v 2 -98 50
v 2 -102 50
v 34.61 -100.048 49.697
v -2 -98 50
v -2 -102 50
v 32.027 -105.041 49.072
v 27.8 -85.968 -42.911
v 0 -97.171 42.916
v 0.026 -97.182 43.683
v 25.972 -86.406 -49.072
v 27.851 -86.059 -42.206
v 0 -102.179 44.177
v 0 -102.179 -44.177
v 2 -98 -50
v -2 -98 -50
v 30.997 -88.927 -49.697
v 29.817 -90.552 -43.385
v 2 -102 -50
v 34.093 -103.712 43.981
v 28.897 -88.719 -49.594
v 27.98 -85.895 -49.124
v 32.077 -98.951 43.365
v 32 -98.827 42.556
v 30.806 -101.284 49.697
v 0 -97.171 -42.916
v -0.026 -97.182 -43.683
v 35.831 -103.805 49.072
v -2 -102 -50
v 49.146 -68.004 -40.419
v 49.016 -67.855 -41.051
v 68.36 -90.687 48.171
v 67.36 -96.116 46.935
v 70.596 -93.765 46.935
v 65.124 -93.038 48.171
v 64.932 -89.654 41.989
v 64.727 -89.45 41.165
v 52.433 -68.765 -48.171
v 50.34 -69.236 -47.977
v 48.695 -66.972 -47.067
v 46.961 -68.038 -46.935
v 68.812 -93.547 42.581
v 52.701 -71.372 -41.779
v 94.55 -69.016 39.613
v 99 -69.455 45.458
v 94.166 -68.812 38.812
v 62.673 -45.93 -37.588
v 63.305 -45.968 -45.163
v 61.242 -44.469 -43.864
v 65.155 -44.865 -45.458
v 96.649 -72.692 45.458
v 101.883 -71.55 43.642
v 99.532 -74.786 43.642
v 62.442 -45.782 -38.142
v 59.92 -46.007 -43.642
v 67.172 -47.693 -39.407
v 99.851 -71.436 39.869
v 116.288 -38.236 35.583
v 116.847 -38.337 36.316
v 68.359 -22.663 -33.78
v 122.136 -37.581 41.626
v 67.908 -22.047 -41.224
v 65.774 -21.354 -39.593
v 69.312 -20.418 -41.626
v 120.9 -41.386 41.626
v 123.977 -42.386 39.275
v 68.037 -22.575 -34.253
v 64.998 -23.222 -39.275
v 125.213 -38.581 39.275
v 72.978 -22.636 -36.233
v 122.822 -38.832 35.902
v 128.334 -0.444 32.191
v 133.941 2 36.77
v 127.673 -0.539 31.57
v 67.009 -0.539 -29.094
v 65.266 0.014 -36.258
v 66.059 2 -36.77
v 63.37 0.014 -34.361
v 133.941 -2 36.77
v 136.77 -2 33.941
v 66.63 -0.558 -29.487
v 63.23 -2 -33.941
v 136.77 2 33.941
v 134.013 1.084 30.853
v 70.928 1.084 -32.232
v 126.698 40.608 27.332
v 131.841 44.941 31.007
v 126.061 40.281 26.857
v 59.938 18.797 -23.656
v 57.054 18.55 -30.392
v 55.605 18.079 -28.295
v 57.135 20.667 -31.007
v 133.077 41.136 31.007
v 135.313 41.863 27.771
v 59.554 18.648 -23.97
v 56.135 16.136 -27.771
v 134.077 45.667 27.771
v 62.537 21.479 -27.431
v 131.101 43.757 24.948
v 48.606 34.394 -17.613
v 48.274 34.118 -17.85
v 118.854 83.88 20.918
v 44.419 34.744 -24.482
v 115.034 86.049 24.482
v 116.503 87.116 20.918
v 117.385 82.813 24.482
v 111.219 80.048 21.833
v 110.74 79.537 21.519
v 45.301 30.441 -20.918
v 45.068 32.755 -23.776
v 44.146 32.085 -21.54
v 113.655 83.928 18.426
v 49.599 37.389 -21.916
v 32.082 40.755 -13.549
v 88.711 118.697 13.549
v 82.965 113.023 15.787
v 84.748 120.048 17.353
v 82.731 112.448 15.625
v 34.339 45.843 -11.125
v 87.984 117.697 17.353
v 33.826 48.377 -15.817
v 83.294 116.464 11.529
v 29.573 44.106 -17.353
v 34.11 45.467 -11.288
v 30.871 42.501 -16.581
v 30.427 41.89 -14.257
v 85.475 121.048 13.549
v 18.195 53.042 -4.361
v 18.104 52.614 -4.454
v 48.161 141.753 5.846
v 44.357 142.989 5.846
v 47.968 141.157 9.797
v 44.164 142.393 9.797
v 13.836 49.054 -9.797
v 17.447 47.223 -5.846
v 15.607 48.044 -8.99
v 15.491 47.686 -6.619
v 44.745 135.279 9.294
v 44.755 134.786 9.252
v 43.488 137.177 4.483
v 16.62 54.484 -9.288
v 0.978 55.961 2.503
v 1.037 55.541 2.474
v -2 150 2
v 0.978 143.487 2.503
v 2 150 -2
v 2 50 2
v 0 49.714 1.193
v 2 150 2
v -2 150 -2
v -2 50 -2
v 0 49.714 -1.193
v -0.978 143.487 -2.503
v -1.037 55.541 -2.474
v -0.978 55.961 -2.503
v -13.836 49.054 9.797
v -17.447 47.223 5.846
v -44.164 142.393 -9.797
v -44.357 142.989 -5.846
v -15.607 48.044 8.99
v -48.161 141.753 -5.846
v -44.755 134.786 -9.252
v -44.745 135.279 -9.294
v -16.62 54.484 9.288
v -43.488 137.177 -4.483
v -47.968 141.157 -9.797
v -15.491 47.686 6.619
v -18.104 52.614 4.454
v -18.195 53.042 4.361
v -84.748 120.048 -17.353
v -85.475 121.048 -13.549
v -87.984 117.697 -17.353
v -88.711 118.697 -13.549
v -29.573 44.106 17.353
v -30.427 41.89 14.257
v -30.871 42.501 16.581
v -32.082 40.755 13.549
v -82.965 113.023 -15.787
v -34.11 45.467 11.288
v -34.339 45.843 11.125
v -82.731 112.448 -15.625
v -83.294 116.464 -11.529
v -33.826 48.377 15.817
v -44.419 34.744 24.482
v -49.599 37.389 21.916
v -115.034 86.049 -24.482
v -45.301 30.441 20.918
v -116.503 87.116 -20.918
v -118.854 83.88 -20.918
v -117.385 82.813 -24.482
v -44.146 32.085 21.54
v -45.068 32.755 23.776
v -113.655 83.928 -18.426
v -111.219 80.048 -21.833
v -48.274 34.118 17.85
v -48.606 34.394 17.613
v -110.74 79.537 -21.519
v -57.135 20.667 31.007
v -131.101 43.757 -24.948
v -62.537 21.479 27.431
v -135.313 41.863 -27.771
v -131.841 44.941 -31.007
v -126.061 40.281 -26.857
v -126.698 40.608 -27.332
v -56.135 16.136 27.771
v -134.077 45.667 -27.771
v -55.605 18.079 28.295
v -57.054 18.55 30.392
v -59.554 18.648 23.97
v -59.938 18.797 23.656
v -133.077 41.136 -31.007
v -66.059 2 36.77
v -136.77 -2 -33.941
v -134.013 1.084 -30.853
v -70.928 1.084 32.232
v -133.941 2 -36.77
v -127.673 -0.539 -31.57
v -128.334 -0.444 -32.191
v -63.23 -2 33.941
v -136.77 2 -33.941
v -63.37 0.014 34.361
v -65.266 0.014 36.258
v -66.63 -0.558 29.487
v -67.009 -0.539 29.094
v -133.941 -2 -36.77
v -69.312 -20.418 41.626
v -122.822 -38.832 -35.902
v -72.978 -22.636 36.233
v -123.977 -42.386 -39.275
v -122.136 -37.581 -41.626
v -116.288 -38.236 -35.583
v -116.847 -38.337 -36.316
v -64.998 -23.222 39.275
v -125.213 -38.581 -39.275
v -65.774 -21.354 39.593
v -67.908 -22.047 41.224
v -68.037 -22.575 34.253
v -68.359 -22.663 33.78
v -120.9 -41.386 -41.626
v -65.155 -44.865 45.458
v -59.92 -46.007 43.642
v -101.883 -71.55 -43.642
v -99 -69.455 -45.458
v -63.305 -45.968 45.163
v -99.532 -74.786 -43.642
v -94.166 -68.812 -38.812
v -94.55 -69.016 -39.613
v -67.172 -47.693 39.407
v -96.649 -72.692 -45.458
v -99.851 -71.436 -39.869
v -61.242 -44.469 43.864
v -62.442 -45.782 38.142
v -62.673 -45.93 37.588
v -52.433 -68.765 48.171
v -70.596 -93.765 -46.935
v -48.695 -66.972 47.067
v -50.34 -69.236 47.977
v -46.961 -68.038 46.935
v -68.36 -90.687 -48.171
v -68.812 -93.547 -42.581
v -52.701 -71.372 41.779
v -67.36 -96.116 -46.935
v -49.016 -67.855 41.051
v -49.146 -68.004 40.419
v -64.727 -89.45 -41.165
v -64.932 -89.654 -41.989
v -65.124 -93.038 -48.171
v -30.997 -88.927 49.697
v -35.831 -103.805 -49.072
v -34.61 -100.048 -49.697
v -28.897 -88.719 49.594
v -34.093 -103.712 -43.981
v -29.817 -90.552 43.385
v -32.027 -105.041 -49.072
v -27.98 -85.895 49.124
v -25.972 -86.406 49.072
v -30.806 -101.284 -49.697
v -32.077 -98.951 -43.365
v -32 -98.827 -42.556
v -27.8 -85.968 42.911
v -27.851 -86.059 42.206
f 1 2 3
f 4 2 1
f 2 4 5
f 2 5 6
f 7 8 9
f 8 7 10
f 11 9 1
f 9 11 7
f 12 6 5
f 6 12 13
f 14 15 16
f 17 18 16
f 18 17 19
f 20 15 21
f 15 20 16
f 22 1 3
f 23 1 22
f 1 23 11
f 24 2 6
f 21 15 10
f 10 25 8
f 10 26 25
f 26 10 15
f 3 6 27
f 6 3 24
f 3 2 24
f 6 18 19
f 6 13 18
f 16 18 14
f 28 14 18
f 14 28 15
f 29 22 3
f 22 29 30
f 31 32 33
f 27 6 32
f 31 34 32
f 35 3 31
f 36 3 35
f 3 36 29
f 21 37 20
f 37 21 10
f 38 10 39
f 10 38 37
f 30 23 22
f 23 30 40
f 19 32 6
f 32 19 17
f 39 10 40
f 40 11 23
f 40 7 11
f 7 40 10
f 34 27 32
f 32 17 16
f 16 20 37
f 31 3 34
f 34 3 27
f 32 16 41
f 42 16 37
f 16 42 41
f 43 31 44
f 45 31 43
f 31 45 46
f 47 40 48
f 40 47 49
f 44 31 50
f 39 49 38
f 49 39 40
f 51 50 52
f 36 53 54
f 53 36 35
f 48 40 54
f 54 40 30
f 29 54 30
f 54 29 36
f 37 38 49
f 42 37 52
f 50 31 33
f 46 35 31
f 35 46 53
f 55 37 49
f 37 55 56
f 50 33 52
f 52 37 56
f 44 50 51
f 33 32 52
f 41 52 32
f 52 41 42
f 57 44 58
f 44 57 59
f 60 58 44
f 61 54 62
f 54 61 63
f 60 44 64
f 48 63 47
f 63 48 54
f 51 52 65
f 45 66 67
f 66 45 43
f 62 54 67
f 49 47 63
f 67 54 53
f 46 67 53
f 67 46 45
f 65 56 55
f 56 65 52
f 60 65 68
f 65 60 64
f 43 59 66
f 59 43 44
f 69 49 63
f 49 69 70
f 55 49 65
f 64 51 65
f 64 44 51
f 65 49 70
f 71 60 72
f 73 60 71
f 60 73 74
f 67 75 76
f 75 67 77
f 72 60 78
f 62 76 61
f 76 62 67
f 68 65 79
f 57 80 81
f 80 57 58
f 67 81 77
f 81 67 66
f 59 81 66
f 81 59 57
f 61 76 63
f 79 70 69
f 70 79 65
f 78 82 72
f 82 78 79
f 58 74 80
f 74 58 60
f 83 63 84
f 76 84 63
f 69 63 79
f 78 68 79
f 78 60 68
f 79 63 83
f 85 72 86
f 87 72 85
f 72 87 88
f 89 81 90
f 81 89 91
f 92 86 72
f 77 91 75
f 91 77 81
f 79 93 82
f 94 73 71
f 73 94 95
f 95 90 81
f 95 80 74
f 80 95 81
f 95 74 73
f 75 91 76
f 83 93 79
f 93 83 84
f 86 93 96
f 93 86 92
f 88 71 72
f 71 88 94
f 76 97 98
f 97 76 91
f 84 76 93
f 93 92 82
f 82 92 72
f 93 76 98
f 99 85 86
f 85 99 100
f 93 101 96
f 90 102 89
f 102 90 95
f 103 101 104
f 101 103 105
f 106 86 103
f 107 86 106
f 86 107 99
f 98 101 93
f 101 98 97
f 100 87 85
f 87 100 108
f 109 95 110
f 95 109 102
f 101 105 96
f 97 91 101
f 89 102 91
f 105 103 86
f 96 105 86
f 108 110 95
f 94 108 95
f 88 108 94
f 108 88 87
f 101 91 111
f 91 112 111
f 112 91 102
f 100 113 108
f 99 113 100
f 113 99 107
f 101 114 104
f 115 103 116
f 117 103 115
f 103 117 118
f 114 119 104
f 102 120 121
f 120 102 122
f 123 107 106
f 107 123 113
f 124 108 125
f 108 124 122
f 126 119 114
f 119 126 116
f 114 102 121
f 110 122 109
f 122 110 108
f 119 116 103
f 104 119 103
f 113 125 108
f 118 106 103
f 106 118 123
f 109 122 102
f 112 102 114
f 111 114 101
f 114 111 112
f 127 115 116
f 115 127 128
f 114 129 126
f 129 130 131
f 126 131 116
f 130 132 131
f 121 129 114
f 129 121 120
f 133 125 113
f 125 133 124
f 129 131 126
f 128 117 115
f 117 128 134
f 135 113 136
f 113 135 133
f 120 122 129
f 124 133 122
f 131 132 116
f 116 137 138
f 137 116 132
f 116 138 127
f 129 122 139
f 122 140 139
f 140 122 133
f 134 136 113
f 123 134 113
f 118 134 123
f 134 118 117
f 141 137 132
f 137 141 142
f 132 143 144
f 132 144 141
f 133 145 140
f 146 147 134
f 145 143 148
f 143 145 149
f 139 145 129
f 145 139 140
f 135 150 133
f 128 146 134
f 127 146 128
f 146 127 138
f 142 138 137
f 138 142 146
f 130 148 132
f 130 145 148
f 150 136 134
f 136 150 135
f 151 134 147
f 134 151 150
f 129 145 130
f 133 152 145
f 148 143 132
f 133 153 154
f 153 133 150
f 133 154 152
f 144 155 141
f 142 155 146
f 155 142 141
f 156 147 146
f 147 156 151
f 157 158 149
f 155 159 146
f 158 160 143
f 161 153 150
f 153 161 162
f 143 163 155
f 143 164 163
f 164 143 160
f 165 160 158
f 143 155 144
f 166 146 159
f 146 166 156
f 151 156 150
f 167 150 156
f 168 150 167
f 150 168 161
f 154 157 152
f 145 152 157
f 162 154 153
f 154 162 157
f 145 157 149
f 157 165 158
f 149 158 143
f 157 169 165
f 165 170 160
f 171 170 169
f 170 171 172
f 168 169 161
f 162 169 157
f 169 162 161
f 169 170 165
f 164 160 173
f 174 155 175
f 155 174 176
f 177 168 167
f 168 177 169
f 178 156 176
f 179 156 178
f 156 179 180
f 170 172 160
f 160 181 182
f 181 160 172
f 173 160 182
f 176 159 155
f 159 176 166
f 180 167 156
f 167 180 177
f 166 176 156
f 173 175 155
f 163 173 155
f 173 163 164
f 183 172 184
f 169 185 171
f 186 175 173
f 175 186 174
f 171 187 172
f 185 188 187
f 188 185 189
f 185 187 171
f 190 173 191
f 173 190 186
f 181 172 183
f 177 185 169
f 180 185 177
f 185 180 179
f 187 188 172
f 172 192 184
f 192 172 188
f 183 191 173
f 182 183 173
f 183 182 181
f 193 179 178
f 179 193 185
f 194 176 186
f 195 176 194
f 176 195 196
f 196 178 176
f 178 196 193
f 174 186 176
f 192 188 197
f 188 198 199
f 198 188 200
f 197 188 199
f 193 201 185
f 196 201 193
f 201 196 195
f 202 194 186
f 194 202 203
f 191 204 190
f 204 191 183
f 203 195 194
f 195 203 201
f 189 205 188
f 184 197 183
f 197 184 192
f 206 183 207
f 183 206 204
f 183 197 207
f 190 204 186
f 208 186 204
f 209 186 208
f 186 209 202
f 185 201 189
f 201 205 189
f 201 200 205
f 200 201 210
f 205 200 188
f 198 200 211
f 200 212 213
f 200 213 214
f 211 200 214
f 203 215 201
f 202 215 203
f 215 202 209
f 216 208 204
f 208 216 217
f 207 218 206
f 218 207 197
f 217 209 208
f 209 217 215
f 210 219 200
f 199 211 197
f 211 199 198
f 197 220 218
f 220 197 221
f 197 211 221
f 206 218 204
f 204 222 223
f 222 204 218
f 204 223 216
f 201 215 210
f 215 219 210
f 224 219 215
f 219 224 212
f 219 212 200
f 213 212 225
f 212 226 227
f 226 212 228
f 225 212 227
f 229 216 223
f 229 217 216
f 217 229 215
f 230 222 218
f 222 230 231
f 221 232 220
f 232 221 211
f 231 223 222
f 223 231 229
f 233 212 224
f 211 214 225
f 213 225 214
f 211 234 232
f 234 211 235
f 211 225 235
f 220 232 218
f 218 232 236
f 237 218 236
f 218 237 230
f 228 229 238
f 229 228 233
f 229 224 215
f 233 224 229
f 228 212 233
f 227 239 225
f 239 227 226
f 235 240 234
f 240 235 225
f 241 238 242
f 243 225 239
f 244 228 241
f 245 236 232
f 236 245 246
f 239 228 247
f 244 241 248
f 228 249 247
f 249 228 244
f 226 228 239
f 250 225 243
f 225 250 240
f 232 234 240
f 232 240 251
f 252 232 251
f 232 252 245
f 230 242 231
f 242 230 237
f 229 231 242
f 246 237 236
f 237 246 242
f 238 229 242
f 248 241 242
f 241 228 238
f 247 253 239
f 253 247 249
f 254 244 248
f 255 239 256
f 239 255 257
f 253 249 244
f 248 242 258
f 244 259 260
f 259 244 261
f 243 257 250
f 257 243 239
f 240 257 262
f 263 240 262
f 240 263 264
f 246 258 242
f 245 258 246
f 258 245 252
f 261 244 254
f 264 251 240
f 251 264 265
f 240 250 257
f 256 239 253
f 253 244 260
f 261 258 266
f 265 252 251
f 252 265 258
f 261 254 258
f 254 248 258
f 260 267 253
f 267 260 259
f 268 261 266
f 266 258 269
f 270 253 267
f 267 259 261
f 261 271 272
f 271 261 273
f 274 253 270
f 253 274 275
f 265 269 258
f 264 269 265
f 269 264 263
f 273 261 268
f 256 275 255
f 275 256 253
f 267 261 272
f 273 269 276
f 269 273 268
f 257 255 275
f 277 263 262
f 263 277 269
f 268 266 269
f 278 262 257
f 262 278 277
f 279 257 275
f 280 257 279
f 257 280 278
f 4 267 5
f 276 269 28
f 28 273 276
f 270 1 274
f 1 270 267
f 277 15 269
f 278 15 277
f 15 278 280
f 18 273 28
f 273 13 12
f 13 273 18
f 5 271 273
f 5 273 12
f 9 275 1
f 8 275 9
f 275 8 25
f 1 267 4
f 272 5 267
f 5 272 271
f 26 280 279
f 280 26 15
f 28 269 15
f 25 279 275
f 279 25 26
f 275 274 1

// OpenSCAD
//This generates a bunch of rods that make a twisted strip

//Resolution of Strip.
number_of_rods = 20;//[20:500]

//Thickness of the wall.
thickness = 4;//[2:0.2:10]

//Height of wall.
length = 100;//[20:200]

//Inner Radius of the strip.
radius = 100;//[20:200]

//Number of twists.
twists = 1;//[0:10]

/* [Hidden] */


for(i=[0:number_of_rods]) {
	value = i/number_of_rods;
	value_1 = (i+1)/ number_of_rods;
	hull() {
		translate([radius*sin(value*360),-radius*cos(value*360),0]) 
		rotate(value*360,[0,0,1]) rotate(value*twists*180,[1,0,0])
			cube([thickness,thickness,length], center=true);
		//
		translate([radius*sin(value_1*360),-radius*cos(value_1*360),0]) 
		rotate(value_1*360,[0,0,1]) rotate(value_1*twists*180,[1,0,0])
			cube([thickness,thickness,length], center=true);
	}
}
//Programmed by Will Webber
// with a thank you to Neon22 for suggeting alterations to use the convex hull
